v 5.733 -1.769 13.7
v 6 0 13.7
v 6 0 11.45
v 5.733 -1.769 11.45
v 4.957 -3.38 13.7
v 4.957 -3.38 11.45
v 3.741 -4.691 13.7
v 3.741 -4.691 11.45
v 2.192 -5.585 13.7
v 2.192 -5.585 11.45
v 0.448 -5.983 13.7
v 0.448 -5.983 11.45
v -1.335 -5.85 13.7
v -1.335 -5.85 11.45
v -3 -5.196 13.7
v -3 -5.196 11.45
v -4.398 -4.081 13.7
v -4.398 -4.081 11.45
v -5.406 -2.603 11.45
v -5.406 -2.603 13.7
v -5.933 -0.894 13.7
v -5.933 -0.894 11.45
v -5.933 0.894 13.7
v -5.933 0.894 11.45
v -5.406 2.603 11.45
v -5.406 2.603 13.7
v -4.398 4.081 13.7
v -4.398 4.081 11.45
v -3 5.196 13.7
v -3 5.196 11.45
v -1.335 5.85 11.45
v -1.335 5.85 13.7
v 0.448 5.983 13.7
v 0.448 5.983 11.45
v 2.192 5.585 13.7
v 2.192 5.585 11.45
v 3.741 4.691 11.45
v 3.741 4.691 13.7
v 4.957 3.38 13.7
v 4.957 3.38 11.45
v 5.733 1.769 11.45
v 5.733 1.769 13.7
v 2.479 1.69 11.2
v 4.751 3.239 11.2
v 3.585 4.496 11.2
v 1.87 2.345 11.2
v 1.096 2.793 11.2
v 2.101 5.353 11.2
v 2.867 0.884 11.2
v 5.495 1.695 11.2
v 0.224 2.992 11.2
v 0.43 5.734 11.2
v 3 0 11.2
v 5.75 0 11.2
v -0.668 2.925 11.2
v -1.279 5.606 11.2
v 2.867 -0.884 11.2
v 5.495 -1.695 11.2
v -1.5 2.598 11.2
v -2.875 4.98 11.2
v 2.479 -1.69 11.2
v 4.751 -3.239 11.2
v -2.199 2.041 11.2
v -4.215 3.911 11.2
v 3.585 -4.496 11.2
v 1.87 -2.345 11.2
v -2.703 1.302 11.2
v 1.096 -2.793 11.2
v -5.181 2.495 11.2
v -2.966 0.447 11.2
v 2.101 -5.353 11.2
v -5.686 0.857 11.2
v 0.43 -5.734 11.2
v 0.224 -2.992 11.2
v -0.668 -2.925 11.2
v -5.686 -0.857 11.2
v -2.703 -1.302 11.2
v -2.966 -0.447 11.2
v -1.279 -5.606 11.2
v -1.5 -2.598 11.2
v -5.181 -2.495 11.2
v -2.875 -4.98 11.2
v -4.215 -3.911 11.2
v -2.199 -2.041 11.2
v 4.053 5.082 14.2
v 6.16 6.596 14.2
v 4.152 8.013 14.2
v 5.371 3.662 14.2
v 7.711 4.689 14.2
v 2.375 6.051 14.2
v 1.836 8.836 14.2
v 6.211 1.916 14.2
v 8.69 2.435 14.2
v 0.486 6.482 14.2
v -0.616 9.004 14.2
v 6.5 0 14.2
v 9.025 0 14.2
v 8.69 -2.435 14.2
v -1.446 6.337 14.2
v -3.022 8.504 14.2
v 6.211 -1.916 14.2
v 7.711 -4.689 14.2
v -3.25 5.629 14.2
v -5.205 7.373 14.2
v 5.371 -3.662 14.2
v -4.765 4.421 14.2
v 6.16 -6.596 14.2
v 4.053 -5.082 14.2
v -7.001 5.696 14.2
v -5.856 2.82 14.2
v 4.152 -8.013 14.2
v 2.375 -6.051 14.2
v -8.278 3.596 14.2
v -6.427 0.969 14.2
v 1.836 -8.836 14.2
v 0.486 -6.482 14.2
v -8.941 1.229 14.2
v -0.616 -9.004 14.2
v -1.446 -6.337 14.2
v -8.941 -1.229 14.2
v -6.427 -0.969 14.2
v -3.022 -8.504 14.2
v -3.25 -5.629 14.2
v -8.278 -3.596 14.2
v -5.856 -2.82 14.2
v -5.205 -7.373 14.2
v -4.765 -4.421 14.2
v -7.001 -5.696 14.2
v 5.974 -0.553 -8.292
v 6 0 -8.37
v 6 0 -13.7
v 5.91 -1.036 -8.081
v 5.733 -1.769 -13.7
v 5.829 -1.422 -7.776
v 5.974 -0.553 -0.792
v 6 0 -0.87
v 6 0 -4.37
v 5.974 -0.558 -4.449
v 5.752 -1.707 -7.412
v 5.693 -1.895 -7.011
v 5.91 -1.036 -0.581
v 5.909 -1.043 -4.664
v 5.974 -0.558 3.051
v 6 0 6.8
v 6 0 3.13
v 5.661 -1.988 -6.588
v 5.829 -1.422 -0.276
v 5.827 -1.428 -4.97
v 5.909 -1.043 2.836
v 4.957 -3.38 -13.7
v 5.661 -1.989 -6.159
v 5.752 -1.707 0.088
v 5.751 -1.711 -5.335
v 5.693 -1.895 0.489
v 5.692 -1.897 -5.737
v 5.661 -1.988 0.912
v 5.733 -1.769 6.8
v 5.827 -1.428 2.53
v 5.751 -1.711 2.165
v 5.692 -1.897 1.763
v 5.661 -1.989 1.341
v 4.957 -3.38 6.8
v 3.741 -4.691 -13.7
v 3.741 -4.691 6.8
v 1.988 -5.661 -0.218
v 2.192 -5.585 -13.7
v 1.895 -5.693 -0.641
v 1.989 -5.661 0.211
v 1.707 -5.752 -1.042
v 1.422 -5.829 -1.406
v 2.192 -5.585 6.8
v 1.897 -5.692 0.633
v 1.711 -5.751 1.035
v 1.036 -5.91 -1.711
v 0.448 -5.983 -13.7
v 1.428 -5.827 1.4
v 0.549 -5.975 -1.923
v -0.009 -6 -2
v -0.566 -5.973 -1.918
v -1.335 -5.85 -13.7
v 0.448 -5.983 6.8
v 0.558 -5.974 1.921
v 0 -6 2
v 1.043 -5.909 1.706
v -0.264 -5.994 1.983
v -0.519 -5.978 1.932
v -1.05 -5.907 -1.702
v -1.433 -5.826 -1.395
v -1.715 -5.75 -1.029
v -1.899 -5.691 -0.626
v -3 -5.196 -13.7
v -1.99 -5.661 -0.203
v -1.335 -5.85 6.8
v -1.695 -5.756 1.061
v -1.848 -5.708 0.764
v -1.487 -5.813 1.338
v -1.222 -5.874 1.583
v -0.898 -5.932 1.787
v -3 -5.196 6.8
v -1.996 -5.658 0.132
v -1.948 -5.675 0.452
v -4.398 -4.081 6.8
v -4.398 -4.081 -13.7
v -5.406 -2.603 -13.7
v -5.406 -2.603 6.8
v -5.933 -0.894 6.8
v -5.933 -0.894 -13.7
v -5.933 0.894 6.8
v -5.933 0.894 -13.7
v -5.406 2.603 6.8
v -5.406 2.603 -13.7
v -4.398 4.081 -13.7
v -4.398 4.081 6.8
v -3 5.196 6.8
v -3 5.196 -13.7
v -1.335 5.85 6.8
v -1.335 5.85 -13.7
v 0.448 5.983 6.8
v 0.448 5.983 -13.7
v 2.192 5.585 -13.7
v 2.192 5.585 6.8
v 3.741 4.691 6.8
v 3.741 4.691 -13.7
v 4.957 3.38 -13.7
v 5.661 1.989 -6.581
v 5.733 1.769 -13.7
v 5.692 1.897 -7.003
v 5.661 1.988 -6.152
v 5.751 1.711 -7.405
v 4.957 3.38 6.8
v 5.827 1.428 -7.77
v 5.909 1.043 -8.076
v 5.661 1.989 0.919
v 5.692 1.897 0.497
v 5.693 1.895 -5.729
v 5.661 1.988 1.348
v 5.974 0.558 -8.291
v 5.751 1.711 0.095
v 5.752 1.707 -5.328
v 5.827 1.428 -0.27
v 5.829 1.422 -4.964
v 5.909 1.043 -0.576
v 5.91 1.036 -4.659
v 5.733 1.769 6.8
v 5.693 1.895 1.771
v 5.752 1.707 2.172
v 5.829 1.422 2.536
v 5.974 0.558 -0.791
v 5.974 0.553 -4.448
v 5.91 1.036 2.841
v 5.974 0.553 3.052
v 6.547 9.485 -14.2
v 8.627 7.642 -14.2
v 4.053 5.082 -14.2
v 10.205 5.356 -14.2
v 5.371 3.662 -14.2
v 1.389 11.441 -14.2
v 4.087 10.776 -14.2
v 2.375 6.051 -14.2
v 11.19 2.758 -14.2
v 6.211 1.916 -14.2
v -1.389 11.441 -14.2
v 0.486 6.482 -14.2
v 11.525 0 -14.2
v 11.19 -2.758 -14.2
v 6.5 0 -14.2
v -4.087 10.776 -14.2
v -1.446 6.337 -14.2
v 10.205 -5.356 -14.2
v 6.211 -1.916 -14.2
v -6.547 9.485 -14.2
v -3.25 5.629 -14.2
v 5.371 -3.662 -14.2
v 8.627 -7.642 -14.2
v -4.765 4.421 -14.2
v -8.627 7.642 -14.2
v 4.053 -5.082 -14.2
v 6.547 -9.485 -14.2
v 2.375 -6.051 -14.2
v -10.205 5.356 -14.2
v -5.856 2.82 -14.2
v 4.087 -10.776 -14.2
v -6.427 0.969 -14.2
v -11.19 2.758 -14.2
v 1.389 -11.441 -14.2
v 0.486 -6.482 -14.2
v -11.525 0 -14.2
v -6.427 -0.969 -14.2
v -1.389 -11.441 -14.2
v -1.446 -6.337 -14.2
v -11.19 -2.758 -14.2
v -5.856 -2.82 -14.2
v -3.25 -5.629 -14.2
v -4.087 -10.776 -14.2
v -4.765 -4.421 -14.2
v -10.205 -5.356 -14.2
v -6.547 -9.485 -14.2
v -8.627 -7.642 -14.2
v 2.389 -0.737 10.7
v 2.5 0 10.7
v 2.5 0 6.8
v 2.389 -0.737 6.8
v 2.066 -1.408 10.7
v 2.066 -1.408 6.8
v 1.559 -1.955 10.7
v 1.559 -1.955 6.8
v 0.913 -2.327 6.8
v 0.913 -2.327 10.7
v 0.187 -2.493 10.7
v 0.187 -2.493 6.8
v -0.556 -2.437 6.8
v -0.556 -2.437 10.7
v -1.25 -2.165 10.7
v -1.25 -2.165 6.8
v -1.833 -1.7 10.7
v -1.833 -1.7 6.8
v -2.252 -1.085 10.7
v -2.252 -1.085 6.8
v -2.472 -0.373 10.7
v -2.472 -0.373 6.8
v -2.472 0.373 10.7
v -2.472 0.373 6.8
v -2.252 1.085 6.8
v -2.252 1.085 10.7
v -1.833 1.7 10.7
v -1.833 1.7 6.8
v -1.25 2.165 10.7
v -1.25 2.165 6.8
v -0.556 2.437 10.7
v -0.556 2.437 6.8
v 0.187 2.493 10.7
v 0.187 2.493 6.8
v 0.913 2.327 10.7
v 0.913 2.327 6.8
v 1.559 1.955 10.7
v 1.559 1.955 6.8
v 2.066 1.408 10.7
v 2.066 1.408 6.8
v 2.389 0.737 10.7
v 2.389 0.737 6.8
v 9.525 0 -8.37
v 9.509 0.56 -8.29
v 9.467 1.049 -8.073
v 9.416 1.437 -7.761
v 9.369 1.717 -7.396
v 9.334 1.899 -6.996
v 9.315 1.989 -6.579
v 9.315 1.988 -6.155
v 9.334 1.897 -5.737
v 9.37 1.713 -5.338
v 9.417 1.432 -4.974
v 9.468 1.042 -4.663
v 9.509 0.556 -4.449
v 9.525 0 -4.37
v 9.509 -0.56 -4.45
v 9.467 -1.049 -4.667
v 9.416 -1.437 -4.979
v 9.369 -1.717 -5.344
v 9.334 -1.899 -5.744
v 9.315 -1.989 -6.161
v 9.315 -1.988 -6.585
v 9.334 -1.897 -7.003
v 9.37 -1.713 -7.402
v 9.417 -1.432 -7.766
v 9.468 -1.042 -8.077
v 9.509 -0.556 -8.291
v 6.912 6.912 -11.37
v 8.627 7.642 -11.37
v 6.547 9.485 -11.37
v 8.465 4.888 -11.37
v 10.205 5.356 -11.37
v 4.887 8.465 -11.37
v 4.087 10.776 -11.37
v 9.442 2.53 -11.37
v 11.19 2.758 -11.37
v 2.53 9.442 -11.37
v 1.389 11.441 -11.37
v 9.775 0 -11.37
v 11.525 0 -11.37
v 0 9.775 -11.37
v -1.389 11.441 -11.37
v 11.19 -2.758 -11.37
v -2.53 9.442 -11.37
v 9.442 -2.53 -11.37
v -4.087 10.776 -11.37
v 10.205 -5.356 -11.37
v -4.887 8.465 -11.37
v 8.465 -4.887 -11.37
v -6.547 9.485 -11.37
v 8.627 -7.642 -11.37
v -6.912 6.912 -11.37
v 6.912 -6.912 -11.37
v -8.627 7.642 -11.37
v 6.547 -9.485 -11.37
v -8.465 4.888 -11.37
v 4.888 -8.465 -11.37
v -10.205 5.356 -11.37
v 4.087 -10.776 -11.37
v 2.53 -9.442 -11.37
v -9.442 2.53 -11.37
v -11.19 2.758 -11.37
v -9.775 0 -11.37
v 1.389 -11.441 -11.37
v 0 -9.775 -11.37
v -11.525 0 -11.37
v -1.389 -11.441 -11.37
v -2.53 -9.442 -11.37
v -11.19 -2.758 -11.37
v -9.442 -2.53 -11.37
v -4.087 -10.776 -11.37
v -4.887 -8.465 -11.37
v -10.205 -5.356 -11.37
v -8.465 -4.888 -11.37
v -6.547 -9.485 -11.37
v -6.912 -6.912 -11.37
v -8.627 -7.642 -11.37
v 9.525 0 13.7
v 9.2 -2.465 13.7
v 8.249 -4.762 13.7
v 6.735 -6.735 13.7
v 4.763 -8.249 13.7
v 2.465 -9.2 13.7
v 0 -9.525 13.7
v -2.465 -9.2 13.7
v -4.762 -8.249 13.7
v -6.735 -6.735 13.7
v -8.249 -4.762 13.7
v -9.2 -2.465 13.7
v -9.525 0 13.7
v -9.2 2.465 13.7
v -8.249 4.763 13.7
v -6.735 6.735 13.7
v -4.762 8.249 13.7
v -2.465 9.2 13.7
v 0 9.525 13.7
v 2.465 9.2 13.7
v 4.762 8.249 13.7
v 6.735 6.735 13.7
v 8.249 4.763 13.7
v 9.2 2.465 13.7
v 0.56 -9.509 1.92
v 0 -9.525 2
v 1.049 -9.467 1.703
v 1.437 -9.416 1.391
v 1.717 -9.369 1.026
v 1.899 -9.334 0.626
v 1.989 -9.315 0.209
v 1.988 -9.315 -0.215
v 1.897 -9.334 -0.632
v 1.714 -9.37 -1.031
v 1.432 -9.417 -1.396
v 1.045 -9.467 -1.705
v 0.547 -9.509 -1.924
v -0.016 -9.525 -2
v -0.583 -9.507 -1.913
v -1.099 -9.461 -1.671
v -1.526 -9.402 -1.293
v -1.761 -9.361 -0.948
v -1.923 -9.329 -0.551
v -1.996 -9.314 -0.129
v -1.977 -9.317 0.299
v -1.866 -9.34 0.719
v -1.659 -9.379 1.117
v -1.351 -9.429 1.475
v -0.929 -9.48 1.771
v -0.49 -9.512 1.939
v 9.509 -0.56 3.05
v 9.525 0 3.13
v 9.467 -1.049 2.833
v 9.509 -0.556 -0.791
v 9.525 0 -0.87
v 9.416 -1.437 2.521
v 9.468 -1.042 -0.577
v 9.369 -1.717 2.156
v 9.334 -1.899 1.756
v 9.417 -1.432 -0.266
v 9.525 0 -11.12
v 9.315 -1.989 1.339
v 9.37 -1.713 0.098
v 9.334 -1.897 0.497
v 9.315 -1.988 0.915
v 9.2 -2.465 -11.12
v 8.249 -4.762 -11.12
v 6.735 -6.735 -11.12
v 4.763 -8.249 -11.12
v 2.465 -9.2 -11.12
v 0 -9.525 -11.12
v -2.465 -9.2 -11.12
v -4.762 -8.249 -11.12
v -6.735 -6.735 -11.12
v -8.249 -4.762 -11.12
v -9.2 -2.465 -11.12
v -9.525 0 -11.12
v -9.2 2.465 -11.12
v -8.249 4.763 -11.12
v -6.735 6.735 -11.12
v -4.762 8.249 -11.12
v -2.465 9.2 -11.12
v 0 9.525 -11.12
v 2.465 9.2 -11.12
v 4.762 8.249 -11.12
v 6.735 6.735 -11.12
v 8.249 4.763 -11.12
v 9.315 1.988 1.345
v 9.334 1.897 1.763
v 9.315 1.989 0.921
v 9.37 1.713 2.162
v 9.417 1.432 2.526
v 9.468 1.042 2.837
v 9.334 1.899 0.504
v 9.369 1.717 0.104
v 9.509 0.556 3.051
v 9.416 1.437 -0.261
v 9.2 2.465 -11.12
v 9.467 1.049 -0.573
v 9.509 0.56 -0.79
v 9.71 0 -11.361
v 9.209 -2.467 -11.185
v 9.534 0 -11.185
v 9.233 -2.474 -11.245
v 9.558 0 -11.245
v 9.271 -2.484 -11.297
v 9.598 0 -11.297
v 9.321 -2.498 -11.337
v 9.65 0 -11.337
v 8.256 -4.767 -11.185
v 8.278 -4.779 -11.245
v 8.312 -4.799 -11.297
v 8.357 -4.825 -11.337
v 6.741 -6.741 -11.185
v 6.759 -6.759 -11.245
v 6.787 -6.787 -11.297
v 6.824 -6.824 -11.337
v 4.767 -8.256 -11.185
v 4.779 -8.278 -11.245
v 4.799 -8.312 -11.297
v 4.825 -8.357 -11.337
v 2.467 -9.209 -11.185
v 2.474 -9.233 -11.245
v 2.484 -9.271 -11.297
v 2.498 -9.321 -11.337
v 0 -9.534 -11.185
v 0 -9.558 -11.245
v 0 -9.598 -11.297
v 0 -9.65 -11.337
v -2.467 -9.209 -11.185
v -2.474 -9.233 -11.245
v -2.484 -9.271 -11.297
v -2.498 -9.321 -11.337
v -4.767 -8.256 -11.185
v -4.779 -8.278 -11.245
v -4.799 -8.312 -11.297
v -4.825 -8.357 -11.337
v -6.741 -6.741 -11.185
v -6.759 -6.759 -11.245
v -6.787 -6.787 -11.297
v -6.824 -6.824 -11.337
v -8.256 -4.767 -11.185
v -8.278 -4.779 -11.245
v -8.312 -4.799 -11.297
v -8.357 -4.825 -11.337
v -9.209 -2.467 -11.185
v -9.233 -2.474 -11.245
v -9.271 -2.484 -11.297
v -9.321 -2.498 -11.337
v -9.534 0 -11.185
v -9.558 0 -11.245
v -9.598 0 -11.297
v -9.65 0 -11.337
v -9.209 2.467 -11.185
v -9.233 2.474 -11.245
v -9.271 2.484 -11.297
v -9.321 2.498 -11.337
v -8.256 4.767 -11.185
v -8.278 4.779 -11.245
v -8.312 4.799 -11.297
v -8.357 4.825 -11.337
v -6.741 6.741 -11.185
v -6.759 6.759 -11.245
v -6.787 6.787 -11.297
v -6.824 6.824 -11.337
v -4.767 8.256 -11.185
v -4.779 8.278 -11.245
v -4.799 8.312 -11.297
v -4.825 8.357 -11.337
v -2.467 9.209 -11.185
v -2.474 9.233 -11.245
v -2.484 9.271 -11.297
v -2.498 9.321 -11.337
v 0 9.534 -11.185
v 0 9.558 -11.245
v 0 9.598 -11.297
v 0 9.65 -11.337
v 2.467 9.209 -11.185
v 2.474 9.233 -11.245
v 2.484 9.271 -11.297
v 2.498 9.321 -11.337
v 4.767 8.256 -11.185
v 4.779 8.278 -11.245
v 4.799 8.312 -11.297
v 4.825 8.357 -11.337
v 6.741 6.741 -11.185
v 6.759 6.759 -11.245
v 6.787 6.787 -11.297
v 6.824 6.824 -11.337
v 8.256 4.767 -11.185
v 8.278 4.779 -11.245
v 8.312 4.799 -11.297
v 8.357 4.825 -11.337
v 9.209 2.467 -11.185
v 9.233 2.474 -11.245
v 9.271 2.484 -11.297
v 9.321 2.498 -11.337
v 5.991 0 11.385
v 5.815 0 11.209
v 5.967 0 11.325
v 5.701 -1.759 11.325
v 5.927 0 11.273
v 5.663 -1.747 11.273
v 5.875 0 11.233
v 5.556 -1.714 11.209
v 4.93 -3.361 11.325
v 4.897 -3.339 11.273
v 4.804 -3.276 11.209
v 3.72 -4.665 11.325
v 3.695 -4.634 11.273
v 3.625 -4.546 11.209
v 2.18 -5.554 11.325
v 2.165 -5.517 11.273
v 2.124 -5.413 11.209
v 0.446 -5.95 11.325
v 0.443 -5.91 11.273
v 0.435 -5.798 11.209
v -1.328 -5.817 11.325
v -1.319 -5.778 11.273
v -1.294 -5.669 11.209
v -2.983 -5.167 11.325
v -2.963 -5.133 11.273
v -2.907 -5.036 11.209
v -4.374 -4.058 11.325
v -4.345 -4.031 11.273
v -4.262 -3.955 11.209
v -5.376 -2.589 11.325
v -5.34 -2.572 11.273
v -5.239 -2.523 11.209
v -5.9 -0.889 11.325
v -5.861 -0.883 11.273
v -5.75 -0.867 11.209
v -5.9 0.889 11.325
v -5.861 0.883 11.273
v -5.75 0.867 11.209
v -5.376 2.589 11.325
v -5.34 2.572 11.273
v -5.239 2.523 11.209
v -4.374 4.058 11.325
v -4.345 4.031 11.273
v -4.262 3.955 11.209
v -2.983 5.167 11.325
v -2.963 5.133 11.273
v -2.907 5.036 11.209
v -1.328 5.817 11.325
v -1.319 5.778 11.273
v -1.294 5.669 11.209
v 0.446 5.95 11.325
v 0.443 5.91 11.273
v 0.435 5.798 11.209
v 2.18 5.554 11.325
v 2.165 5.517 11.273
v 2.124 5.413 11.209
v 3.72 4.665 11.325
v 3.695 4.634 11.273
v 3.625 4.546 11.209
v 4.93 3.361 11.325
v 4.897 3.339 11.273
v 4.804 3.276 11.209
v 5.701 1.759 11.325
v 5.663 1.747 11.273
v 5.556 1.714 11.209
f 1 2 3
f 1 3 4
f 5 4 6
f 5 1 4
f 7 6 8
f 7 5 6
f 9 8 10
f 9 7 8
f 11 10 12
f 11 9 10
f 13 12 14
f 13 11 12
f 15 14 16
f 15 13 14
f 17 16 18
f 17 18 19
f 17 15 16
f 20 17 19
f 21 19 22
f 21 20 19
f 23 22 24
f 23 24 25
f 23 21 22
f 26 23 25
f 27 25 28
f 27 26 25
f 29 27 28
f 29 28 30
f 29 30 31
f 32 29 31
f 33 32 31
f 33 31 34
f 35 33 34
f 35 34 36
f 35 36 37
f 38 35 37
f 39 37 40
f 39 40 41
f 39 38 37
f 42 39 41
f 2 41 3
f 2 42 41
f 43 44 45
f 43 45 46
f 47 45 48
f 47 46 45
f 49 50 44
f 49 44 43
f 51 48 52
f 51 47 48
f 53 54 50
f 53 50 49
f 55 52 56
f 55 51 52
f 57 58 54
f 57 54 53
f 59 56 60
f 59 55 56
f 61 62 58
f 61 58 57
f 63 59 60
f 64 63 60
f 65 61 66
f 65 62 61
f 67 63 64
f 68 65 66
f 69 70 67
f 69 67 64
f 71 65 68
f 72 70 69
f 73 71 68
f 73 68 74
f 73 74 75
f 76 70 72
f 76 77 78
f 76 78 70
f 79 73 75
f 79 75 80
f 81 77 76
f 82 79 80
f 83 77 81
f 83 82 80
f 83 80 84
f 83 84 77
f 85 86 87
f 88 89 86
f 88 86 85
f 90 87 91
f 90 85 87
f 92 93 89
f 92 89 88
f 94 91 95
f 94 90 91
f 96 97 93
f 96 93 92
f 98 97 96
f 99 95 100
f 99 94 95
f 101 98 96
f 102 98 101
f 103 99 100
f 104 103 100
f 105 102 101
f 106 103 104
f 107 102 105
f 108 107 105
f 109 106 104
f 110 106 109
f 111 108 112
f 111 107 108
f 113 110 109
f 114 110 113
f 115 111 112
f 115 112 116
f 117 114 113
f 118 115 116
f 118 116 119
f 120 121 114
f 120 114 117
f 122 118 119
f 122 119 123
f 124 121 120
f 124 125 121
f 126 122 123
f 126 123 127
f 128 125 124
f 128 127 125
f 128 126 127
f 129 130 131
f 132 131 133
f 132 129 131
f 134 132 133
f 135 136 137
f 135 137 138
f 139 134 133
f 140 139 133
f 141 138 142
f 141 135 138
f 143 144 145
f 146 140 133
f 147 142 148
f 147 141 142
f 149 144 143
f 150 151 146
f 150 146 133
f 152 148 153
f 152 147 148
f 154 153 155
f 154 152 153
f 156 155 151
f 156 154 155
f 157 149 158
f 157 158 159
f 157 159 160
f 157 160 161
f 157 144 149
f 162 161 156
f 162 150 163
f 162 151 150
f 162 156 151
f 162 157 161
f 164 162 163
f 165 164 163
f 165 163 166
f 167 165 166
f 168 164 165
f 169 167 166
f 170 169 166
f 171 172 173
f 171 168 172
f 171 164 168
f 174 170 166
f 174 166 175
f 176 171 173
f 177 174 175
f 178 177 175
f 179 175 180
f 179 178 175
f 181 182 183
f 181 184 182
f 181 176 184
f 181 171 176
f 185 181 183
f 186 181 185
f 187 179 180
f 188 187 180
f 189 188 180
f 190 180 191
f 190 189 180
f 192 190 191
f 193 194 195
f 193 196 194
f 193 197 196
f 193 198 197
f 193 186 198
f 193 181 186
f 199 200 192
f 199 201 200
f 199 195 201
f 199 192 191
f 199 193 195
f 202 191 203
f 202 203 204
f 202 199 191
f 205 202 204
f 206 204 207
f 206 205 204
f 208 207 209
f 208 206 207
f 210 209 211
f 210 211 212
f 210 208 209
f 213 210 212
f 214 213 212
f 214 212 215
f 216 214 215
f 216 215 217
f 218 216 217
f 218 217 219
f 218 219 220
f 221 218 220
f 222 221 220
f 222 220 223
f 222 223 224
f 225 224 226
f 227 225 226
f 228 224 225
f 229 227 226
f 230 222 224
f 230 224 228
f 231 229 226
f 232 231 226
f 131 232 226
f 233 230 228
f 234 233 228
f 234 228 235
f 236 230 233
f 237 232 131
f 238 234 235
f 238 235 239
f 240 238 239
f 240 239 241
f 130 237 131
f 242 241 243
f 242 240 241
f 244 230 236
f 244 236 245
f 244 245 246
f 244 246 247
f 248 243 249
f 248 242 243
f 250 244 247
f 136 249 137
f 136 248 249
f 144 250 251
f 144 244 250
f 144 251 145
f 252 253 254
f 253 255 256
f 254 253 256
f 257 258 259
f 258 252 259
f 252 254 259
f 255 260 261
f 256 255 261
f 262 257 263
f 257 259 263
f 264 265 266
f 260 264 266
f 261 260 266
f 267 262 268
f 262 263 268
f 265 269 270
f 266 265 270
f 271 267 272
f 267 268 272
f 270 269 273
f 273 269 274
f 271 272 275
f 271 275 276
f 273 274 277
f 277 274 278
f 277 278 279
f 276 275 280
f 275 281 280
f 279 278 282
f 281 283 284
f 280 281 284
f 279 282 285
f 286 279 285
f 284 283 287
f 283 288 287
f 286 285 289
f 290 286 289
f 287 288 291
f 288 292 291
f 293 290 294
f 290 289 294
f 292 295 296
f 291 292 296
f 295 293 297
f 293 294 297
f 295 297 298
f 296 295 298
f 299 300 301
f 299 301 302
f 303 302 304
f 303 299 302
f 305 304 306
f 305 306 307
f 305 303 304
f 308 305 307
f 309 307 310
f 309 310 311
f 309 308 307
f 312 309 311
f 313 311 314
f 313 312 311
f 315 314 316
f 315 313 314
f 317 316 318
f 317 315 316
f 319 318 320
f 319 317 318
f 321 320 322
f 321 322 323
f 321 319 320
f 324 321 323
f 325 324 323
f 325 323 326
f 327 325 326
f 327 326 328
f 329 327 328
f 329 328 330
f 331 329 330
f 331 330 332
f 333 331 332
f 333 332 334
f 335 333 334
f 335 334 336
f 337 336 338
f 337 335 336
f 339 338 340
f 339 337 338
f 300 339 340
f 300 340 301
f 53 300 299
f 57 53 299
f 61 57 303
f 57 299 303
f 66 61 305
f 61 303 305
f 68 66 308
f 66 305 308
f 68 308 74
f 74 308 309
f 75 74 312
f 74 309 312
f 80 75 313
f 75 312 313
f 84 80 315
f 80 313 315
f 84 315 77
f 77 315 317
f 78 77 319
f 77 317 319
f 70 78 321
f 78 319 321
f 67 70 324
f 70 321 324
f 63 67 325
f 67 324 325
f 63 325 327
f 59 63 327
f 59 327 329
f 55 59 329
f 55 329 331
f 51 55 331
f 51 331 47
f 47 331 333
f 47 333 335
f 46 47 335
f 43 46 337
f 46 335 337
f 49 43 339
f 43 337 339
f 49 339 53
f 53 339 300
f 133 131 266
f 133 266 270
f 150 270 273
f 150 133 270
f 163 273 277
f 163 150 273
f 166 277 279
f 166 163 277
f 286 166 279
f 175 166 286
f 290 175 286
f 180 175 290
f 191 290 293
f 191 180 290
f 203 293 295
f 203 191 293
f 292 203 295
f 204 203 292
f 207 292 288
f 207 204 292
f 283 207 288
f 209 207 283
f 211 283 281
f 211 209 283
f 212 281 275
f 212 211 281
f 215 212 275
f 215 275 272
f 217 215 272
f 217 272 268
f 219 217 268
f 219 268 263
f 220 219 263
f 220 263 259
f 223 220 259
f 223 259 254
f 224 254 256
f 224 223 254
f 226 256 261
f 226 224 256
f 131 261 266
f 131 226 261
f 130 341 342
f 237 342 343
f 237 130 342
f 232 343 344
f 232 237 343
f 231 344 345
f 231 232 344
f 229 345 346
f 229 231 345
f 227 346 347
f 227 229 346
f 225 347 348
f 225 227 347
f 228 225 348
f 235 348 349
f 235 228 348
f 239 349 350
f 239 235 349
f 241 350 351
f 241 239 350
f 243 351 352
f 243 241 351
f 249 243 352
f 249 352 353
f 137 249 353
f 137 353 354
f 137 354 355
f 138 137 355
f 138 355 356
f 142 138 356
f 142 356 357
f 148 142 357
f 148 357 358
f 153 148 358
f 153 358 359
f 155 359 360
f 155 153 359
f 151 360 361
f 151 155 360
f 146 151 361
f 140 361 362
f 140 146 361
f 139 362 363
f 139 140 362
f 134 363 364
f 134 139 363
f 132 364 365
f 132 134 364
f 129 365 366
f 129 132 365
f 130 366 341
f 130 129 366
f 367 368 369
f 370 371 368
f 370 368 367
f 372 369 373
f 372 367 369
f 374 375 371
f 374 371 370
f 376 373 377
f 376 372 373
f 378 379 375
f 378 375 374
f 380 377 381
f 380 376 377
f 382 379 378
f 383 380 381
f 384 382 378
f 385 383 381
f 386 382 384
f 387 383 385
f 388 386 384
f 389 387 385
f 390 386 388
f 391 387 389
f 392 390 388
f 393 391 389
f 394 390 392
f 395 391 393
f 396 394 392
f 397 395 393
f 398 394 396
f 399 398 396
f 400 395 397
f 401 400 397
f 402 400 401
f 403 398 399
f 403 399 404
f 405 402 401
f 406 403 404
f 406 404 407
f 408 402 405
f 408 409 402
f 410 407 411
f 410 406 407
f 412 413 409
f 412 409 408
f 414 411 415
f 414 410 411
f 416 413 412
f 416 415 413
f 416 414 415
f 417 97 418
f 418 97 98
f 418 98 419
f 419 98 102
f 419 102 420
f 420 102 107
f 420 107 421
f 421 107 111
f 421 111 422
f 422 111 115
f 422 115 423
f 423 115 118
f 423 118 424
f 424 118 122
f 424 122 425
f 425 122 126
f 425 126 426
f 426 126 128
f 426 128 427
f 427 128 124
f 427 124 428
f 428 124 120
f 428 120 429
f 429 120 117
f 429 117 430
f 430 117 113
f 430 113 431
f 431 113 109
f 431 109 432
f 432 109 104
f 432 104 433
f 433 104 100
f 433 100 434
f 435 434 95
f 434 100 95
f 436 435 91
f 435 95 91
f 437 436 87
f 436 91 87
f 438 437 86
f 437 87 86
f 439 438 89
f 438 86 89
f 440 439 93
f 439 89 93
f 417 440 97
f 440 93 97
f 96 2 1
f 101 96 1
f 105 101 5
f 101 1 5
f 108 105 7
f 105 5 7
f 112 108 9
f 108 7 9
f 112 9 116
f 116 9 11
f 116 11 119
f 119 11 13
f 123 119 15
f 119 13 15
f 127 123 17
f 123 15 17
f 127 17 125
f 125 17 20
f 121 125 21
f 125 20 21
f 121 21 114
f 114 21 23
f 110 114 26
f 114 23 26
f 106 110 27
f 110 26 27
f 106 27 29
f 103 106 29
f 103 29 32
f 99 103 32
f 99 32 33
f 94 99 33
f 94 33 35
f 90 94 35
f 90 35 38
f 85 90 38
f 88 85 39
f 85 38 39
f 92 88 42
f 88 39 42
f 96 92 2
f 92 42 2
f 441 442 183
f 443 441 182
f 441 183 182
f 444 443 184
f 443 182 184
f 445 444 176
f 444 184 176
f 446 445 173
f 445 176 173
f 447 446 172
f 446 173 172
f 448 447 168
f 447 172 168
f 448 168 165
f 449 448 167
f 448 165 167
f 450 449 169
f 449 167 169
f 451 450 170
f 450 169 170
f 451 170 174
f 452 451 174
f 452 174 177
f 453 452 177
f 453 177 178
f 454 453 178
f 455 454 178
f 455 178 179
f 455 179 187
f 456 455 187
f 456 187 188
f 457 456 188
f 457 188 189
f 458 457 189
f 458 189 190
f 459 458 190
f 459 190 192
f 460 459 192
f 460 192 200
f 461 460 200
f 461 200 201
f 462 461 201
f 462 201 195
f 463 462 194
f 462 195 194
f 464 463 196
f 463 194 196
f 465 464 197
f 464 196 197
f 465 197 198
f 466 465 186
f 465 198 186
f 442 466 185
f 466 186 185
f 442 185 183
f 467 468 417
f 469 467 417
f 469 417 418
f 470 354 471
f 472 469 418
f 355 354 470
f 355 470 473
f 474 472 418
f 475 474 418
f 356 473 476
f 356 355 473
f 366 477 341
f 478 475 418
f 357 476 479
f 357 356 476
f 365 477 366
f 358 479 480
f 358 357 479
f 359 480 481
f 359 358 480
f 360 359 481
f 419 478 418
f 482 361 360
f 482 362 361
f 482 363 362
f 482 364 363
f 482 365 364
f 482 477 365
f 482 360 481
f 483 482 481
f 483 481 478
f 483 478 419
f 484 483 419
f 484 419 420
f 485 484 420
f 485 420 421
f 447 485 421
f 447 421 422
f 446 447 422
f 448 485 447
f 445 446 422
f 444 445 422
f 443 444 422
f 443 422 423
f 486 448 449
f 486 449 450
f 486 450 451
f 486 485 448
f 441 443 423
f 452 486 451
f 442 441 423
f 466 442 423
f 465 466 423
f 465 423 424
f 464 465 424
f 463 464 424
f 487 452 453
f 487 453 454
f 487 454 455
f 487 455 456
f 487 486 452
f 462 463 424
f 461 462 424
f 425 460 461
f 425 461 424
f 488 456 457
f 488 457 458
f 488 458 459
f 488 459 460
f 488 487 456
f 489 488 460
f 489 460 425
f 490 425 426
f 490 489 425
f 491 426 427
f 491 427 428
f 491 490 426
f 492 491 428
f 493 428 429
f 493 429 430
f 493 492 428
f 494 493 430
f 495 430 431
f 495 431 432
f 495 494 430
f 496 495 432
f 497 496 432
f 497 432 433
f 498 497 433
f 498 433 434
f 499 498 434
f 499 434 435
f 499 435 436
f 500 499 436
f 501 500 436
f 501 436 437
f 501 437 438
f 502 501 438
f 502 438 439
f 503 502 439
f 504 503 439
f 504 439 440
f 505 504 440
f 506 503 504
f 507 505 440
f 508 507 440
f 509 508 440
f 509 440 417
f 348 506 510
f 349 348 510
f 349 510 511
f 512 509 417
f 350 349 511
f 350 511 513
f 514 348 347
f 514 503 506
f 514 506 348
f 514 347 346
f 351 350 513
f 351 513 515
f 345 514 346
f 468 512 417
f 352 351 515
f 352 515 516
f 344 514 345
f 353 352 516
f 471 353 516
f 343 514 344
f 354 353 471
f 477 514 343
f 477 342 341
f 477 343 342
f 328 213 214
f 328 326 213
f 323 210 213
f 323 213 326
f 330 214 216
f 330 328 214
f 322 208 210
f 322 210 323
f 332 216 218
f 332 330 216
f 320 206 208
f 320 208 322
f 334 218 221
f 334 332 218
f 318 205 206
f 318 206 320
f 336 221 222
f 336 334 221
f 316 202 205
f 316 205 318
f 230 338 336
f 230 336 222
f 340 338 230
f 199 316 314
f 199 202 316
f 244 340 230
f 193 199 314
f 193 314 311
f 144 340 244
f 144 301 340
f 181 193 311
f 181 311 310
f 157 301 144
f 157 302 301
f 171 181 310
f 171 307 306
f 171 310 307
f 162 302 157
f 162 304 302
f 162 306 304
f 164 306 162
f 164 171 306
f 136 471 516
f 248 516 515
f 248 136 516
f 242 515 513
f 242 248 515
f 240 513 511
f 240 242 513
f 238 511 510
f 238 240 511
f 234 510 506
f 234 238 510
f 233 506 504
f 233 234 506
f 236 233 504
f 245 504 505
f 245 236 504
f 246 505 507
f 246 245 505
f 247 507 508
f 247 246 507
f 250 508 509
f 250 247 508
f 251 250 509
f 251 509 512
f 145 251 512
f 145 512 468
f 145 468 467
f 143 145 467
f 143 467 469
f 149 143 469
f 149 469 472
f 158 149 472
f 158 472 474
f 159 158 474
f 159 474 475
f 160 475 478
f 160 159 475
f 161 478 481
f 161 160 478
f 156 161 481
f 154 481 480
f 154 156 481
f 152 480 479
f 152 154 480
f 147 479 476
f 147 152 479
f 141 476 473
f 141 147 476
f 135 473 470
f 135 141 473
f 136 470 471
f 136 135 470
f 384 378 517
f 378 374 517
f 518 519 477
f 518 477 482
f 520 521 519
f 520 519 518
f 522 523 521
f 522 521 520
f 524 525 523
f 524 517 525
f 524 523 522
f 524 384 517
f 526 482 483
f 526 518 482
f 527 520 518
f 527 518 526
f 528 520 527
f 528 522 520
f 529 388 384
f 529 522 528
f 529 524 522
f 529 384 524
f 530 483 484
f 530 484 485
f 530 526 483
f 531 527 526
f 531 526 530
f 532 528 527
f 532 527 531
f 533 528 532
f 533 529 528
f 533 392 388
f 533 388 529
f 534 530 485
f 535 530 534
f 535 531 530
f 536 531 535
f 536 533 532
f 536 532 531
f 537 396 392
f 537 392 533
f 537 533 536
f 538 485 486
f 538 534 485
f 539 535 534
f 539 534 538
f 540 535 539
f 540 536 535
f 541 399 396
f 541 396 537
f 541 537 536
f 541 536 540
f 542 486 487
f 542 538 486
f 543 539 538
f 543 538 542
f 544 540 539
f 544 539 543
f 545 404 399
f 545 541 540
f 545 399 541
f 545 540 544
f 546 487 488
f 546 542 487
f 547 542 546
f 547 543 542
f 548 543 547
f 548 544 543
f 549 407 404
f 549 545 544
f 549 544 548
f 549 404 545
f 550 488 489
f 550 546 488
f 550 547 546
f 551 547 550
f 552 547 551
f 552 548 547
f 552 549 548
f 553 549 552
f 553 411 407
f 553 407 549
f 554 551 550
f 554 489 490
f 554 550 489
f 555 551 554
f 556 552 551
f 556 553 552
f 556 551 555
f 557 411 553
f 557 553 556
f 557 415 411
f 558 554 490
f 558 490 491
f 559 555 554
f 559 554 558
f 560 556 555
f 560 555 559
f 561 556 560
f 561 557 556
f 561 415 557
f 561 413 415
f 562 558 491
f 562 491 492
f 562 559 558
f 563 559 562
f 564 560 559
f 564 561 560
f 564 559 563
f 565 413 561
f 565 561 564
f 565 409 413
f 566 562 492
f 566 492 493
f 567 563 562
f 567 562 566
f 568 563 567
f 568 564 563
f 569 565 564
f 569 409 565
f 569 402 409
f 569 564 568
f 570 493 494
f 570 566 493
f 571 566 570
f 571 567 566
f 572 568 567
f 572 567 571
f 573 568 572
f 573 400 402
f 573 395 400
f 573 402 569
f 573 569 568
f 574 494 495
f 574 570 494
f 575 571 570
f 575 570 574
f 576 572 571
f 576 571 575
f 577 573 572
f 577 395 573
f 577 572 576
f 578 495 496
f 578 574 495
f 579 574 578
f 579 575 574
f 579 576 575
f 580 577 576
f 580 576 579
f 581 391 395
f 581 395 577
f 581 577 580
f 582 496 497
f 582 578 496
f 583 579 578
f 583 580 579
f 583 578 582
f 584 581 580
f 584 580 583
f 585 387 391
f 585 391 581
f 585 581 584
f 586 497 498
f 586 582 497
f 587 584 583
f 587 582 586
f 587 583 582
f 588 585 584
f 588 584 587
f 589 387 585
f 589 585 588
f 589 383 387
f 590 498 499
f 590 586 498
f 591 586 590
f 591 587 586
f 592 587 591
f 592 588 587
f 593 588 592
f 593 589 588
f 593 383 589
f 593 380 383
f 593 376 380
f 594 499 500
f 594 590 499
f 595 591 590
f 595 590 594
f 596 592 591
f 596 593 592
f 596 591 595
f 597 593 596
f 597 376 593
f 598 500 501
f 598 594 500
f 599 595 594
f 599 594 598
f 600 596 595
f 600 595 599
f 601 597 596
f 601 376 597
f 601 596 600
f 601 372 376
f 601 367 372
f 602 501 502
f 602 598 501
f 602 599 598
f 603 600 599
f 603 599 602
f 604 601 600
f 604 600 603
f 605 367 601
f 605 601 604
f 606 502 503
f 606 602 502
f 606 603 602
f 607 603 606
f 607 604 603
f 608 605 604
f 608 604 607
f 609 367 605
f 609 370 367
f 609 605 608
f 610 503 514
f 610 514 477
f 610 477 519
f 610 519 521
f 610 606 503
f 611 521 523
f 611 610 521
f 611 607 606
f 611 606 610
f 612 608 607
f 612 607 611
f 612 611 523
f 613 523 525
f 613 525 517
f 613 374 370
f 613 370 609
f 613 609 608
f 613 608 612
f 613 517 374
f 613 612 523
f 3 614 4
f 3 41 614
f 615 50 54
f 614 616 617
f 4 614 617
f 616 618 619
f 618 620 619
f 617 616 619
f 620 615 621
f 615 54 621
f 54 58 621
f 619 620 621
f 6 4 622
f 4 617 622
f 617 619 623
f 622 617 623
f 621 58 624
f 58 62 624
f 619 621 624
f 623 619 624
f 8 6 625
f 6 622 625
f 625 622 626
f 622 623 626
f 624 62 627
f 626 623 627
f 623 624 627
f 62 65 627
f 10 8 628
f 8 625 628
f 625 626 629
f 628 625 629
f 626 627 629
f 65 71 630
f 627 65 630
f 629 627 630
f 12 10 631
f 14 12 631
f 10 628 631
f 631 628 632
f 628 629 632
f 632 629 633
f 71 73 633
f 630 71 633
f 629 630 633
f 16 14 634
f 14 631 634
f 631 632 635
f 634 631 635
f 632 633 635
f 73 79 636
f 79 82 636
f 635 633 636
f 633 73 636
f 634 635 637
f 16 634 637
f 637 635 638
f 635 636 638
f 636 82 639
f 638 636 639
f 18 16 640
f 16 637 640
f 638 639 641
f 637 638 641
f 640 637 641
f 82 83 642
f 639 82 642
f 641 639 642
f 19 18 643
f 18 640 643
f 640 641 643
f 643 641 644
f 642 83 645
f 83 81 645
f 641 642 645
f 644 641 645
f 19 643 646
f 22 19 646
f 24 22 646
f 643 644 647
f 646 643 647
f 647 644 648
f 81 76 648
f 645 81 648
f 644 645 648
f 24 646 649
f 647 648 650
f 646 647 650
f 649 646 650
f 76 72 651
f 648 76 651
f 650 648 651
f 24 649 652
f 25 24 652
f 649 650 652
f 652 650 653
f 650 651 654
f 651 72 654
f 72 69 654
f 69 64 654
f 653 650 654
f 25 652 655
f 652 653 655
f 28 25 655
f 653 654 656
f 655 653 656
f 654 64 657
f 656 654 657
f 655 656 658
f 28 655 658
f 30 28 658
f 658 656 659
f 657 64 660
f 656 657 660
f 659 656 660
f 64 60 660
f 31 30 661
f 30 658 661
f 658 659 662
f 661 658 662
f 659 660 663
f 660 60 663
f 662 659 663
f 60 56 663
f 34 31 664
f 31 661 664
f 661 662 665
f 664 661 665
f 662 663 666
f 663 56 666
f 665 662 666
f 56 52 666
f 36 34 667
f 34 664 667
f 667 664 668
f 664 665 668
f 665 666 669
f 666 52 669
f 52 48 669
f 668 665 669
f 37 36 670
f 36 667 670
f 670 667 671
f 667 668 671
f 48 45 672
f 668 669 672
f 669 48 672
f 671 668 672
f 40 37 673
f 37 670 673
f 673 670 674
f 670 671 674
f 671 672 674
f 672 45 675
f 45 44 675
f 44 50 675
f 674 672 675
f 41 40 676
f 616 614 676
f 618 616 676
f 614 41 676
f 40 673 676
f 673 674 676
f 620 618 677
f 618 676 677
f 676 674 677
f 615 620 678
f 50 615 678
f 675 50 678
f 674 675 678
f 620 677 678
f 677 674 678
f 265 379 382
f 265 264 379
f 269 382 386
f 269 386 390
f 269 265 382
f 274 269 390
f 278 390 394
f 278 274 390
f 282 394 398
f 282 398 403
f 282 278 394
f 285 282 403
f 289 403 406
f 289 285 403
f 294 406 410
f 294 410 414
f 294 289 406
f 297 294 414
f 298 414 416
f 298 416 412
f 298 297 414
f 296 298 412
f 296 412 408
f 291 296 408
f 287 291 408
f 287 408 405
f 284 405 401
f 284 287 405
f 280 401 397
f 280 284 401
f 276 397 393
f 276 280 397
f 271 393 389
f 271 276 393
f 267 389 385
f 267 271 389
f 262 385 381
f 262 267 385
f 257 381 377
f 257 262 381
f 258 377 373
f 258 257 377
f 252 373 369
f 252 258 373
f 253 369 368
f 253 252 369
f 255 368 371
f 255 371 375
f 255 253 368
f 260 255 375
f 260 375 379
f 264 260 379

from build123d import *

# Parameters (mm, degrees)
SKETCH3_W          = 2.83
SKETCH3_H          = 2
CHAMFER1_SIZE      = 0.5
FILLET1_R          = 0.25
SKETCH4_R          = 2
CUT_EXTRUDE2_DEPTH = 22.616920456
SKETCH5_R          = 2
CUT_EXTRUDE3_DEPTH = 22.616920456


with BuildPart() as part:
    # Sketch1 → Revolve1 (revolve)
    with BuildSketch(Plane(origin=(0, 0, 0), x_dir=(0, 0, -1), z_dir=(1, 0, 0)), mode=Mode.PRIVATE) as revolve1_sk:
        Polygon((-14.2, 6), (-14.2, 9.525), (14.2, 9.525), (14.2, 6), (-6.8, 6), (-6.8, 2.5), (-11.2, 2.5), (-11.2, 6), align=None)
    revolve(revolve1_sk.sketch.rotate(Axis((0, 0, 14.2), (0, 0, -1)), 90), axis=Axis((0, 0, 14.2), (0, 0, -1)))

    # Sketch3 → Revolve2 (revolve)
    with BuildSketch(Plane(origin=(0, 0, 0), x_dir=(0, 0, -1), z_dir=(1, 0, 0)), mode=Mode.PRIVATE) as revolve2_sk:
        with Locations((12.785, 10.525)):
            Rectangle(SKETCH3_W, SKETCH3_H)
    revolve(revolve2_sk.sketch.rotate(Axis((0, 0, 0), (0, 0, -1)), 90), axis=Axis((0, 0, 0), (0, 0, -1)))

    # Chamfer1
    chamfer1_edges = [part.edges().sort_by_distance(p)[0] for p in [
        (-2.5, 0, 11.2),
        (-6, 0, -14.2),
        (-9.525, 0, 14.2),
        (-6, 0, 14.2),
    ]]
    chamfer(chamfer1_edges, length=CHAMFER1_SIZE)

    # Fillet1
    fillet1_edges = [part.edges().sort_by_distance(p)[0] for p in [
        (-9.525, 0, -11.37),
        (-6, 0, 11.2),
    ]]
    fillet(fillet1_edges, radius=FILLET1_R)

    # Sketch4 → Cut-Extrude2 (cut, through all)
    with BuildSketch(Plane(origin=(0, 0, 0), x_dir=(0, 0, -1), z_dir=(1, 0, 0))):
        with Locations((6.37, 0)):
            Circle(SKETCH4_R)
        with Locations((-1.13, 0)):
            Circle(SKETCH4_R)
    extrude(amount=CUT_EXTRUDE2_DEPTH, mode=Mode.SUBTRACT)

    # Sketch5 → Cut-Extrude3 (cut, through all)
    with BuildSketch(Plane(origin=(0, 0, 0), x_dir=(1, 0, 0), z_dir=(0, 1, 0))):
        with Locations(Location((0, 0, 0), (0, 0, 270))):
            Circle(SKETCH5_R)
    extrude(amount=-CUT_EXTRUDE3_DEPTH, mode=Mode.SUBTRACT)


solid = part.part
